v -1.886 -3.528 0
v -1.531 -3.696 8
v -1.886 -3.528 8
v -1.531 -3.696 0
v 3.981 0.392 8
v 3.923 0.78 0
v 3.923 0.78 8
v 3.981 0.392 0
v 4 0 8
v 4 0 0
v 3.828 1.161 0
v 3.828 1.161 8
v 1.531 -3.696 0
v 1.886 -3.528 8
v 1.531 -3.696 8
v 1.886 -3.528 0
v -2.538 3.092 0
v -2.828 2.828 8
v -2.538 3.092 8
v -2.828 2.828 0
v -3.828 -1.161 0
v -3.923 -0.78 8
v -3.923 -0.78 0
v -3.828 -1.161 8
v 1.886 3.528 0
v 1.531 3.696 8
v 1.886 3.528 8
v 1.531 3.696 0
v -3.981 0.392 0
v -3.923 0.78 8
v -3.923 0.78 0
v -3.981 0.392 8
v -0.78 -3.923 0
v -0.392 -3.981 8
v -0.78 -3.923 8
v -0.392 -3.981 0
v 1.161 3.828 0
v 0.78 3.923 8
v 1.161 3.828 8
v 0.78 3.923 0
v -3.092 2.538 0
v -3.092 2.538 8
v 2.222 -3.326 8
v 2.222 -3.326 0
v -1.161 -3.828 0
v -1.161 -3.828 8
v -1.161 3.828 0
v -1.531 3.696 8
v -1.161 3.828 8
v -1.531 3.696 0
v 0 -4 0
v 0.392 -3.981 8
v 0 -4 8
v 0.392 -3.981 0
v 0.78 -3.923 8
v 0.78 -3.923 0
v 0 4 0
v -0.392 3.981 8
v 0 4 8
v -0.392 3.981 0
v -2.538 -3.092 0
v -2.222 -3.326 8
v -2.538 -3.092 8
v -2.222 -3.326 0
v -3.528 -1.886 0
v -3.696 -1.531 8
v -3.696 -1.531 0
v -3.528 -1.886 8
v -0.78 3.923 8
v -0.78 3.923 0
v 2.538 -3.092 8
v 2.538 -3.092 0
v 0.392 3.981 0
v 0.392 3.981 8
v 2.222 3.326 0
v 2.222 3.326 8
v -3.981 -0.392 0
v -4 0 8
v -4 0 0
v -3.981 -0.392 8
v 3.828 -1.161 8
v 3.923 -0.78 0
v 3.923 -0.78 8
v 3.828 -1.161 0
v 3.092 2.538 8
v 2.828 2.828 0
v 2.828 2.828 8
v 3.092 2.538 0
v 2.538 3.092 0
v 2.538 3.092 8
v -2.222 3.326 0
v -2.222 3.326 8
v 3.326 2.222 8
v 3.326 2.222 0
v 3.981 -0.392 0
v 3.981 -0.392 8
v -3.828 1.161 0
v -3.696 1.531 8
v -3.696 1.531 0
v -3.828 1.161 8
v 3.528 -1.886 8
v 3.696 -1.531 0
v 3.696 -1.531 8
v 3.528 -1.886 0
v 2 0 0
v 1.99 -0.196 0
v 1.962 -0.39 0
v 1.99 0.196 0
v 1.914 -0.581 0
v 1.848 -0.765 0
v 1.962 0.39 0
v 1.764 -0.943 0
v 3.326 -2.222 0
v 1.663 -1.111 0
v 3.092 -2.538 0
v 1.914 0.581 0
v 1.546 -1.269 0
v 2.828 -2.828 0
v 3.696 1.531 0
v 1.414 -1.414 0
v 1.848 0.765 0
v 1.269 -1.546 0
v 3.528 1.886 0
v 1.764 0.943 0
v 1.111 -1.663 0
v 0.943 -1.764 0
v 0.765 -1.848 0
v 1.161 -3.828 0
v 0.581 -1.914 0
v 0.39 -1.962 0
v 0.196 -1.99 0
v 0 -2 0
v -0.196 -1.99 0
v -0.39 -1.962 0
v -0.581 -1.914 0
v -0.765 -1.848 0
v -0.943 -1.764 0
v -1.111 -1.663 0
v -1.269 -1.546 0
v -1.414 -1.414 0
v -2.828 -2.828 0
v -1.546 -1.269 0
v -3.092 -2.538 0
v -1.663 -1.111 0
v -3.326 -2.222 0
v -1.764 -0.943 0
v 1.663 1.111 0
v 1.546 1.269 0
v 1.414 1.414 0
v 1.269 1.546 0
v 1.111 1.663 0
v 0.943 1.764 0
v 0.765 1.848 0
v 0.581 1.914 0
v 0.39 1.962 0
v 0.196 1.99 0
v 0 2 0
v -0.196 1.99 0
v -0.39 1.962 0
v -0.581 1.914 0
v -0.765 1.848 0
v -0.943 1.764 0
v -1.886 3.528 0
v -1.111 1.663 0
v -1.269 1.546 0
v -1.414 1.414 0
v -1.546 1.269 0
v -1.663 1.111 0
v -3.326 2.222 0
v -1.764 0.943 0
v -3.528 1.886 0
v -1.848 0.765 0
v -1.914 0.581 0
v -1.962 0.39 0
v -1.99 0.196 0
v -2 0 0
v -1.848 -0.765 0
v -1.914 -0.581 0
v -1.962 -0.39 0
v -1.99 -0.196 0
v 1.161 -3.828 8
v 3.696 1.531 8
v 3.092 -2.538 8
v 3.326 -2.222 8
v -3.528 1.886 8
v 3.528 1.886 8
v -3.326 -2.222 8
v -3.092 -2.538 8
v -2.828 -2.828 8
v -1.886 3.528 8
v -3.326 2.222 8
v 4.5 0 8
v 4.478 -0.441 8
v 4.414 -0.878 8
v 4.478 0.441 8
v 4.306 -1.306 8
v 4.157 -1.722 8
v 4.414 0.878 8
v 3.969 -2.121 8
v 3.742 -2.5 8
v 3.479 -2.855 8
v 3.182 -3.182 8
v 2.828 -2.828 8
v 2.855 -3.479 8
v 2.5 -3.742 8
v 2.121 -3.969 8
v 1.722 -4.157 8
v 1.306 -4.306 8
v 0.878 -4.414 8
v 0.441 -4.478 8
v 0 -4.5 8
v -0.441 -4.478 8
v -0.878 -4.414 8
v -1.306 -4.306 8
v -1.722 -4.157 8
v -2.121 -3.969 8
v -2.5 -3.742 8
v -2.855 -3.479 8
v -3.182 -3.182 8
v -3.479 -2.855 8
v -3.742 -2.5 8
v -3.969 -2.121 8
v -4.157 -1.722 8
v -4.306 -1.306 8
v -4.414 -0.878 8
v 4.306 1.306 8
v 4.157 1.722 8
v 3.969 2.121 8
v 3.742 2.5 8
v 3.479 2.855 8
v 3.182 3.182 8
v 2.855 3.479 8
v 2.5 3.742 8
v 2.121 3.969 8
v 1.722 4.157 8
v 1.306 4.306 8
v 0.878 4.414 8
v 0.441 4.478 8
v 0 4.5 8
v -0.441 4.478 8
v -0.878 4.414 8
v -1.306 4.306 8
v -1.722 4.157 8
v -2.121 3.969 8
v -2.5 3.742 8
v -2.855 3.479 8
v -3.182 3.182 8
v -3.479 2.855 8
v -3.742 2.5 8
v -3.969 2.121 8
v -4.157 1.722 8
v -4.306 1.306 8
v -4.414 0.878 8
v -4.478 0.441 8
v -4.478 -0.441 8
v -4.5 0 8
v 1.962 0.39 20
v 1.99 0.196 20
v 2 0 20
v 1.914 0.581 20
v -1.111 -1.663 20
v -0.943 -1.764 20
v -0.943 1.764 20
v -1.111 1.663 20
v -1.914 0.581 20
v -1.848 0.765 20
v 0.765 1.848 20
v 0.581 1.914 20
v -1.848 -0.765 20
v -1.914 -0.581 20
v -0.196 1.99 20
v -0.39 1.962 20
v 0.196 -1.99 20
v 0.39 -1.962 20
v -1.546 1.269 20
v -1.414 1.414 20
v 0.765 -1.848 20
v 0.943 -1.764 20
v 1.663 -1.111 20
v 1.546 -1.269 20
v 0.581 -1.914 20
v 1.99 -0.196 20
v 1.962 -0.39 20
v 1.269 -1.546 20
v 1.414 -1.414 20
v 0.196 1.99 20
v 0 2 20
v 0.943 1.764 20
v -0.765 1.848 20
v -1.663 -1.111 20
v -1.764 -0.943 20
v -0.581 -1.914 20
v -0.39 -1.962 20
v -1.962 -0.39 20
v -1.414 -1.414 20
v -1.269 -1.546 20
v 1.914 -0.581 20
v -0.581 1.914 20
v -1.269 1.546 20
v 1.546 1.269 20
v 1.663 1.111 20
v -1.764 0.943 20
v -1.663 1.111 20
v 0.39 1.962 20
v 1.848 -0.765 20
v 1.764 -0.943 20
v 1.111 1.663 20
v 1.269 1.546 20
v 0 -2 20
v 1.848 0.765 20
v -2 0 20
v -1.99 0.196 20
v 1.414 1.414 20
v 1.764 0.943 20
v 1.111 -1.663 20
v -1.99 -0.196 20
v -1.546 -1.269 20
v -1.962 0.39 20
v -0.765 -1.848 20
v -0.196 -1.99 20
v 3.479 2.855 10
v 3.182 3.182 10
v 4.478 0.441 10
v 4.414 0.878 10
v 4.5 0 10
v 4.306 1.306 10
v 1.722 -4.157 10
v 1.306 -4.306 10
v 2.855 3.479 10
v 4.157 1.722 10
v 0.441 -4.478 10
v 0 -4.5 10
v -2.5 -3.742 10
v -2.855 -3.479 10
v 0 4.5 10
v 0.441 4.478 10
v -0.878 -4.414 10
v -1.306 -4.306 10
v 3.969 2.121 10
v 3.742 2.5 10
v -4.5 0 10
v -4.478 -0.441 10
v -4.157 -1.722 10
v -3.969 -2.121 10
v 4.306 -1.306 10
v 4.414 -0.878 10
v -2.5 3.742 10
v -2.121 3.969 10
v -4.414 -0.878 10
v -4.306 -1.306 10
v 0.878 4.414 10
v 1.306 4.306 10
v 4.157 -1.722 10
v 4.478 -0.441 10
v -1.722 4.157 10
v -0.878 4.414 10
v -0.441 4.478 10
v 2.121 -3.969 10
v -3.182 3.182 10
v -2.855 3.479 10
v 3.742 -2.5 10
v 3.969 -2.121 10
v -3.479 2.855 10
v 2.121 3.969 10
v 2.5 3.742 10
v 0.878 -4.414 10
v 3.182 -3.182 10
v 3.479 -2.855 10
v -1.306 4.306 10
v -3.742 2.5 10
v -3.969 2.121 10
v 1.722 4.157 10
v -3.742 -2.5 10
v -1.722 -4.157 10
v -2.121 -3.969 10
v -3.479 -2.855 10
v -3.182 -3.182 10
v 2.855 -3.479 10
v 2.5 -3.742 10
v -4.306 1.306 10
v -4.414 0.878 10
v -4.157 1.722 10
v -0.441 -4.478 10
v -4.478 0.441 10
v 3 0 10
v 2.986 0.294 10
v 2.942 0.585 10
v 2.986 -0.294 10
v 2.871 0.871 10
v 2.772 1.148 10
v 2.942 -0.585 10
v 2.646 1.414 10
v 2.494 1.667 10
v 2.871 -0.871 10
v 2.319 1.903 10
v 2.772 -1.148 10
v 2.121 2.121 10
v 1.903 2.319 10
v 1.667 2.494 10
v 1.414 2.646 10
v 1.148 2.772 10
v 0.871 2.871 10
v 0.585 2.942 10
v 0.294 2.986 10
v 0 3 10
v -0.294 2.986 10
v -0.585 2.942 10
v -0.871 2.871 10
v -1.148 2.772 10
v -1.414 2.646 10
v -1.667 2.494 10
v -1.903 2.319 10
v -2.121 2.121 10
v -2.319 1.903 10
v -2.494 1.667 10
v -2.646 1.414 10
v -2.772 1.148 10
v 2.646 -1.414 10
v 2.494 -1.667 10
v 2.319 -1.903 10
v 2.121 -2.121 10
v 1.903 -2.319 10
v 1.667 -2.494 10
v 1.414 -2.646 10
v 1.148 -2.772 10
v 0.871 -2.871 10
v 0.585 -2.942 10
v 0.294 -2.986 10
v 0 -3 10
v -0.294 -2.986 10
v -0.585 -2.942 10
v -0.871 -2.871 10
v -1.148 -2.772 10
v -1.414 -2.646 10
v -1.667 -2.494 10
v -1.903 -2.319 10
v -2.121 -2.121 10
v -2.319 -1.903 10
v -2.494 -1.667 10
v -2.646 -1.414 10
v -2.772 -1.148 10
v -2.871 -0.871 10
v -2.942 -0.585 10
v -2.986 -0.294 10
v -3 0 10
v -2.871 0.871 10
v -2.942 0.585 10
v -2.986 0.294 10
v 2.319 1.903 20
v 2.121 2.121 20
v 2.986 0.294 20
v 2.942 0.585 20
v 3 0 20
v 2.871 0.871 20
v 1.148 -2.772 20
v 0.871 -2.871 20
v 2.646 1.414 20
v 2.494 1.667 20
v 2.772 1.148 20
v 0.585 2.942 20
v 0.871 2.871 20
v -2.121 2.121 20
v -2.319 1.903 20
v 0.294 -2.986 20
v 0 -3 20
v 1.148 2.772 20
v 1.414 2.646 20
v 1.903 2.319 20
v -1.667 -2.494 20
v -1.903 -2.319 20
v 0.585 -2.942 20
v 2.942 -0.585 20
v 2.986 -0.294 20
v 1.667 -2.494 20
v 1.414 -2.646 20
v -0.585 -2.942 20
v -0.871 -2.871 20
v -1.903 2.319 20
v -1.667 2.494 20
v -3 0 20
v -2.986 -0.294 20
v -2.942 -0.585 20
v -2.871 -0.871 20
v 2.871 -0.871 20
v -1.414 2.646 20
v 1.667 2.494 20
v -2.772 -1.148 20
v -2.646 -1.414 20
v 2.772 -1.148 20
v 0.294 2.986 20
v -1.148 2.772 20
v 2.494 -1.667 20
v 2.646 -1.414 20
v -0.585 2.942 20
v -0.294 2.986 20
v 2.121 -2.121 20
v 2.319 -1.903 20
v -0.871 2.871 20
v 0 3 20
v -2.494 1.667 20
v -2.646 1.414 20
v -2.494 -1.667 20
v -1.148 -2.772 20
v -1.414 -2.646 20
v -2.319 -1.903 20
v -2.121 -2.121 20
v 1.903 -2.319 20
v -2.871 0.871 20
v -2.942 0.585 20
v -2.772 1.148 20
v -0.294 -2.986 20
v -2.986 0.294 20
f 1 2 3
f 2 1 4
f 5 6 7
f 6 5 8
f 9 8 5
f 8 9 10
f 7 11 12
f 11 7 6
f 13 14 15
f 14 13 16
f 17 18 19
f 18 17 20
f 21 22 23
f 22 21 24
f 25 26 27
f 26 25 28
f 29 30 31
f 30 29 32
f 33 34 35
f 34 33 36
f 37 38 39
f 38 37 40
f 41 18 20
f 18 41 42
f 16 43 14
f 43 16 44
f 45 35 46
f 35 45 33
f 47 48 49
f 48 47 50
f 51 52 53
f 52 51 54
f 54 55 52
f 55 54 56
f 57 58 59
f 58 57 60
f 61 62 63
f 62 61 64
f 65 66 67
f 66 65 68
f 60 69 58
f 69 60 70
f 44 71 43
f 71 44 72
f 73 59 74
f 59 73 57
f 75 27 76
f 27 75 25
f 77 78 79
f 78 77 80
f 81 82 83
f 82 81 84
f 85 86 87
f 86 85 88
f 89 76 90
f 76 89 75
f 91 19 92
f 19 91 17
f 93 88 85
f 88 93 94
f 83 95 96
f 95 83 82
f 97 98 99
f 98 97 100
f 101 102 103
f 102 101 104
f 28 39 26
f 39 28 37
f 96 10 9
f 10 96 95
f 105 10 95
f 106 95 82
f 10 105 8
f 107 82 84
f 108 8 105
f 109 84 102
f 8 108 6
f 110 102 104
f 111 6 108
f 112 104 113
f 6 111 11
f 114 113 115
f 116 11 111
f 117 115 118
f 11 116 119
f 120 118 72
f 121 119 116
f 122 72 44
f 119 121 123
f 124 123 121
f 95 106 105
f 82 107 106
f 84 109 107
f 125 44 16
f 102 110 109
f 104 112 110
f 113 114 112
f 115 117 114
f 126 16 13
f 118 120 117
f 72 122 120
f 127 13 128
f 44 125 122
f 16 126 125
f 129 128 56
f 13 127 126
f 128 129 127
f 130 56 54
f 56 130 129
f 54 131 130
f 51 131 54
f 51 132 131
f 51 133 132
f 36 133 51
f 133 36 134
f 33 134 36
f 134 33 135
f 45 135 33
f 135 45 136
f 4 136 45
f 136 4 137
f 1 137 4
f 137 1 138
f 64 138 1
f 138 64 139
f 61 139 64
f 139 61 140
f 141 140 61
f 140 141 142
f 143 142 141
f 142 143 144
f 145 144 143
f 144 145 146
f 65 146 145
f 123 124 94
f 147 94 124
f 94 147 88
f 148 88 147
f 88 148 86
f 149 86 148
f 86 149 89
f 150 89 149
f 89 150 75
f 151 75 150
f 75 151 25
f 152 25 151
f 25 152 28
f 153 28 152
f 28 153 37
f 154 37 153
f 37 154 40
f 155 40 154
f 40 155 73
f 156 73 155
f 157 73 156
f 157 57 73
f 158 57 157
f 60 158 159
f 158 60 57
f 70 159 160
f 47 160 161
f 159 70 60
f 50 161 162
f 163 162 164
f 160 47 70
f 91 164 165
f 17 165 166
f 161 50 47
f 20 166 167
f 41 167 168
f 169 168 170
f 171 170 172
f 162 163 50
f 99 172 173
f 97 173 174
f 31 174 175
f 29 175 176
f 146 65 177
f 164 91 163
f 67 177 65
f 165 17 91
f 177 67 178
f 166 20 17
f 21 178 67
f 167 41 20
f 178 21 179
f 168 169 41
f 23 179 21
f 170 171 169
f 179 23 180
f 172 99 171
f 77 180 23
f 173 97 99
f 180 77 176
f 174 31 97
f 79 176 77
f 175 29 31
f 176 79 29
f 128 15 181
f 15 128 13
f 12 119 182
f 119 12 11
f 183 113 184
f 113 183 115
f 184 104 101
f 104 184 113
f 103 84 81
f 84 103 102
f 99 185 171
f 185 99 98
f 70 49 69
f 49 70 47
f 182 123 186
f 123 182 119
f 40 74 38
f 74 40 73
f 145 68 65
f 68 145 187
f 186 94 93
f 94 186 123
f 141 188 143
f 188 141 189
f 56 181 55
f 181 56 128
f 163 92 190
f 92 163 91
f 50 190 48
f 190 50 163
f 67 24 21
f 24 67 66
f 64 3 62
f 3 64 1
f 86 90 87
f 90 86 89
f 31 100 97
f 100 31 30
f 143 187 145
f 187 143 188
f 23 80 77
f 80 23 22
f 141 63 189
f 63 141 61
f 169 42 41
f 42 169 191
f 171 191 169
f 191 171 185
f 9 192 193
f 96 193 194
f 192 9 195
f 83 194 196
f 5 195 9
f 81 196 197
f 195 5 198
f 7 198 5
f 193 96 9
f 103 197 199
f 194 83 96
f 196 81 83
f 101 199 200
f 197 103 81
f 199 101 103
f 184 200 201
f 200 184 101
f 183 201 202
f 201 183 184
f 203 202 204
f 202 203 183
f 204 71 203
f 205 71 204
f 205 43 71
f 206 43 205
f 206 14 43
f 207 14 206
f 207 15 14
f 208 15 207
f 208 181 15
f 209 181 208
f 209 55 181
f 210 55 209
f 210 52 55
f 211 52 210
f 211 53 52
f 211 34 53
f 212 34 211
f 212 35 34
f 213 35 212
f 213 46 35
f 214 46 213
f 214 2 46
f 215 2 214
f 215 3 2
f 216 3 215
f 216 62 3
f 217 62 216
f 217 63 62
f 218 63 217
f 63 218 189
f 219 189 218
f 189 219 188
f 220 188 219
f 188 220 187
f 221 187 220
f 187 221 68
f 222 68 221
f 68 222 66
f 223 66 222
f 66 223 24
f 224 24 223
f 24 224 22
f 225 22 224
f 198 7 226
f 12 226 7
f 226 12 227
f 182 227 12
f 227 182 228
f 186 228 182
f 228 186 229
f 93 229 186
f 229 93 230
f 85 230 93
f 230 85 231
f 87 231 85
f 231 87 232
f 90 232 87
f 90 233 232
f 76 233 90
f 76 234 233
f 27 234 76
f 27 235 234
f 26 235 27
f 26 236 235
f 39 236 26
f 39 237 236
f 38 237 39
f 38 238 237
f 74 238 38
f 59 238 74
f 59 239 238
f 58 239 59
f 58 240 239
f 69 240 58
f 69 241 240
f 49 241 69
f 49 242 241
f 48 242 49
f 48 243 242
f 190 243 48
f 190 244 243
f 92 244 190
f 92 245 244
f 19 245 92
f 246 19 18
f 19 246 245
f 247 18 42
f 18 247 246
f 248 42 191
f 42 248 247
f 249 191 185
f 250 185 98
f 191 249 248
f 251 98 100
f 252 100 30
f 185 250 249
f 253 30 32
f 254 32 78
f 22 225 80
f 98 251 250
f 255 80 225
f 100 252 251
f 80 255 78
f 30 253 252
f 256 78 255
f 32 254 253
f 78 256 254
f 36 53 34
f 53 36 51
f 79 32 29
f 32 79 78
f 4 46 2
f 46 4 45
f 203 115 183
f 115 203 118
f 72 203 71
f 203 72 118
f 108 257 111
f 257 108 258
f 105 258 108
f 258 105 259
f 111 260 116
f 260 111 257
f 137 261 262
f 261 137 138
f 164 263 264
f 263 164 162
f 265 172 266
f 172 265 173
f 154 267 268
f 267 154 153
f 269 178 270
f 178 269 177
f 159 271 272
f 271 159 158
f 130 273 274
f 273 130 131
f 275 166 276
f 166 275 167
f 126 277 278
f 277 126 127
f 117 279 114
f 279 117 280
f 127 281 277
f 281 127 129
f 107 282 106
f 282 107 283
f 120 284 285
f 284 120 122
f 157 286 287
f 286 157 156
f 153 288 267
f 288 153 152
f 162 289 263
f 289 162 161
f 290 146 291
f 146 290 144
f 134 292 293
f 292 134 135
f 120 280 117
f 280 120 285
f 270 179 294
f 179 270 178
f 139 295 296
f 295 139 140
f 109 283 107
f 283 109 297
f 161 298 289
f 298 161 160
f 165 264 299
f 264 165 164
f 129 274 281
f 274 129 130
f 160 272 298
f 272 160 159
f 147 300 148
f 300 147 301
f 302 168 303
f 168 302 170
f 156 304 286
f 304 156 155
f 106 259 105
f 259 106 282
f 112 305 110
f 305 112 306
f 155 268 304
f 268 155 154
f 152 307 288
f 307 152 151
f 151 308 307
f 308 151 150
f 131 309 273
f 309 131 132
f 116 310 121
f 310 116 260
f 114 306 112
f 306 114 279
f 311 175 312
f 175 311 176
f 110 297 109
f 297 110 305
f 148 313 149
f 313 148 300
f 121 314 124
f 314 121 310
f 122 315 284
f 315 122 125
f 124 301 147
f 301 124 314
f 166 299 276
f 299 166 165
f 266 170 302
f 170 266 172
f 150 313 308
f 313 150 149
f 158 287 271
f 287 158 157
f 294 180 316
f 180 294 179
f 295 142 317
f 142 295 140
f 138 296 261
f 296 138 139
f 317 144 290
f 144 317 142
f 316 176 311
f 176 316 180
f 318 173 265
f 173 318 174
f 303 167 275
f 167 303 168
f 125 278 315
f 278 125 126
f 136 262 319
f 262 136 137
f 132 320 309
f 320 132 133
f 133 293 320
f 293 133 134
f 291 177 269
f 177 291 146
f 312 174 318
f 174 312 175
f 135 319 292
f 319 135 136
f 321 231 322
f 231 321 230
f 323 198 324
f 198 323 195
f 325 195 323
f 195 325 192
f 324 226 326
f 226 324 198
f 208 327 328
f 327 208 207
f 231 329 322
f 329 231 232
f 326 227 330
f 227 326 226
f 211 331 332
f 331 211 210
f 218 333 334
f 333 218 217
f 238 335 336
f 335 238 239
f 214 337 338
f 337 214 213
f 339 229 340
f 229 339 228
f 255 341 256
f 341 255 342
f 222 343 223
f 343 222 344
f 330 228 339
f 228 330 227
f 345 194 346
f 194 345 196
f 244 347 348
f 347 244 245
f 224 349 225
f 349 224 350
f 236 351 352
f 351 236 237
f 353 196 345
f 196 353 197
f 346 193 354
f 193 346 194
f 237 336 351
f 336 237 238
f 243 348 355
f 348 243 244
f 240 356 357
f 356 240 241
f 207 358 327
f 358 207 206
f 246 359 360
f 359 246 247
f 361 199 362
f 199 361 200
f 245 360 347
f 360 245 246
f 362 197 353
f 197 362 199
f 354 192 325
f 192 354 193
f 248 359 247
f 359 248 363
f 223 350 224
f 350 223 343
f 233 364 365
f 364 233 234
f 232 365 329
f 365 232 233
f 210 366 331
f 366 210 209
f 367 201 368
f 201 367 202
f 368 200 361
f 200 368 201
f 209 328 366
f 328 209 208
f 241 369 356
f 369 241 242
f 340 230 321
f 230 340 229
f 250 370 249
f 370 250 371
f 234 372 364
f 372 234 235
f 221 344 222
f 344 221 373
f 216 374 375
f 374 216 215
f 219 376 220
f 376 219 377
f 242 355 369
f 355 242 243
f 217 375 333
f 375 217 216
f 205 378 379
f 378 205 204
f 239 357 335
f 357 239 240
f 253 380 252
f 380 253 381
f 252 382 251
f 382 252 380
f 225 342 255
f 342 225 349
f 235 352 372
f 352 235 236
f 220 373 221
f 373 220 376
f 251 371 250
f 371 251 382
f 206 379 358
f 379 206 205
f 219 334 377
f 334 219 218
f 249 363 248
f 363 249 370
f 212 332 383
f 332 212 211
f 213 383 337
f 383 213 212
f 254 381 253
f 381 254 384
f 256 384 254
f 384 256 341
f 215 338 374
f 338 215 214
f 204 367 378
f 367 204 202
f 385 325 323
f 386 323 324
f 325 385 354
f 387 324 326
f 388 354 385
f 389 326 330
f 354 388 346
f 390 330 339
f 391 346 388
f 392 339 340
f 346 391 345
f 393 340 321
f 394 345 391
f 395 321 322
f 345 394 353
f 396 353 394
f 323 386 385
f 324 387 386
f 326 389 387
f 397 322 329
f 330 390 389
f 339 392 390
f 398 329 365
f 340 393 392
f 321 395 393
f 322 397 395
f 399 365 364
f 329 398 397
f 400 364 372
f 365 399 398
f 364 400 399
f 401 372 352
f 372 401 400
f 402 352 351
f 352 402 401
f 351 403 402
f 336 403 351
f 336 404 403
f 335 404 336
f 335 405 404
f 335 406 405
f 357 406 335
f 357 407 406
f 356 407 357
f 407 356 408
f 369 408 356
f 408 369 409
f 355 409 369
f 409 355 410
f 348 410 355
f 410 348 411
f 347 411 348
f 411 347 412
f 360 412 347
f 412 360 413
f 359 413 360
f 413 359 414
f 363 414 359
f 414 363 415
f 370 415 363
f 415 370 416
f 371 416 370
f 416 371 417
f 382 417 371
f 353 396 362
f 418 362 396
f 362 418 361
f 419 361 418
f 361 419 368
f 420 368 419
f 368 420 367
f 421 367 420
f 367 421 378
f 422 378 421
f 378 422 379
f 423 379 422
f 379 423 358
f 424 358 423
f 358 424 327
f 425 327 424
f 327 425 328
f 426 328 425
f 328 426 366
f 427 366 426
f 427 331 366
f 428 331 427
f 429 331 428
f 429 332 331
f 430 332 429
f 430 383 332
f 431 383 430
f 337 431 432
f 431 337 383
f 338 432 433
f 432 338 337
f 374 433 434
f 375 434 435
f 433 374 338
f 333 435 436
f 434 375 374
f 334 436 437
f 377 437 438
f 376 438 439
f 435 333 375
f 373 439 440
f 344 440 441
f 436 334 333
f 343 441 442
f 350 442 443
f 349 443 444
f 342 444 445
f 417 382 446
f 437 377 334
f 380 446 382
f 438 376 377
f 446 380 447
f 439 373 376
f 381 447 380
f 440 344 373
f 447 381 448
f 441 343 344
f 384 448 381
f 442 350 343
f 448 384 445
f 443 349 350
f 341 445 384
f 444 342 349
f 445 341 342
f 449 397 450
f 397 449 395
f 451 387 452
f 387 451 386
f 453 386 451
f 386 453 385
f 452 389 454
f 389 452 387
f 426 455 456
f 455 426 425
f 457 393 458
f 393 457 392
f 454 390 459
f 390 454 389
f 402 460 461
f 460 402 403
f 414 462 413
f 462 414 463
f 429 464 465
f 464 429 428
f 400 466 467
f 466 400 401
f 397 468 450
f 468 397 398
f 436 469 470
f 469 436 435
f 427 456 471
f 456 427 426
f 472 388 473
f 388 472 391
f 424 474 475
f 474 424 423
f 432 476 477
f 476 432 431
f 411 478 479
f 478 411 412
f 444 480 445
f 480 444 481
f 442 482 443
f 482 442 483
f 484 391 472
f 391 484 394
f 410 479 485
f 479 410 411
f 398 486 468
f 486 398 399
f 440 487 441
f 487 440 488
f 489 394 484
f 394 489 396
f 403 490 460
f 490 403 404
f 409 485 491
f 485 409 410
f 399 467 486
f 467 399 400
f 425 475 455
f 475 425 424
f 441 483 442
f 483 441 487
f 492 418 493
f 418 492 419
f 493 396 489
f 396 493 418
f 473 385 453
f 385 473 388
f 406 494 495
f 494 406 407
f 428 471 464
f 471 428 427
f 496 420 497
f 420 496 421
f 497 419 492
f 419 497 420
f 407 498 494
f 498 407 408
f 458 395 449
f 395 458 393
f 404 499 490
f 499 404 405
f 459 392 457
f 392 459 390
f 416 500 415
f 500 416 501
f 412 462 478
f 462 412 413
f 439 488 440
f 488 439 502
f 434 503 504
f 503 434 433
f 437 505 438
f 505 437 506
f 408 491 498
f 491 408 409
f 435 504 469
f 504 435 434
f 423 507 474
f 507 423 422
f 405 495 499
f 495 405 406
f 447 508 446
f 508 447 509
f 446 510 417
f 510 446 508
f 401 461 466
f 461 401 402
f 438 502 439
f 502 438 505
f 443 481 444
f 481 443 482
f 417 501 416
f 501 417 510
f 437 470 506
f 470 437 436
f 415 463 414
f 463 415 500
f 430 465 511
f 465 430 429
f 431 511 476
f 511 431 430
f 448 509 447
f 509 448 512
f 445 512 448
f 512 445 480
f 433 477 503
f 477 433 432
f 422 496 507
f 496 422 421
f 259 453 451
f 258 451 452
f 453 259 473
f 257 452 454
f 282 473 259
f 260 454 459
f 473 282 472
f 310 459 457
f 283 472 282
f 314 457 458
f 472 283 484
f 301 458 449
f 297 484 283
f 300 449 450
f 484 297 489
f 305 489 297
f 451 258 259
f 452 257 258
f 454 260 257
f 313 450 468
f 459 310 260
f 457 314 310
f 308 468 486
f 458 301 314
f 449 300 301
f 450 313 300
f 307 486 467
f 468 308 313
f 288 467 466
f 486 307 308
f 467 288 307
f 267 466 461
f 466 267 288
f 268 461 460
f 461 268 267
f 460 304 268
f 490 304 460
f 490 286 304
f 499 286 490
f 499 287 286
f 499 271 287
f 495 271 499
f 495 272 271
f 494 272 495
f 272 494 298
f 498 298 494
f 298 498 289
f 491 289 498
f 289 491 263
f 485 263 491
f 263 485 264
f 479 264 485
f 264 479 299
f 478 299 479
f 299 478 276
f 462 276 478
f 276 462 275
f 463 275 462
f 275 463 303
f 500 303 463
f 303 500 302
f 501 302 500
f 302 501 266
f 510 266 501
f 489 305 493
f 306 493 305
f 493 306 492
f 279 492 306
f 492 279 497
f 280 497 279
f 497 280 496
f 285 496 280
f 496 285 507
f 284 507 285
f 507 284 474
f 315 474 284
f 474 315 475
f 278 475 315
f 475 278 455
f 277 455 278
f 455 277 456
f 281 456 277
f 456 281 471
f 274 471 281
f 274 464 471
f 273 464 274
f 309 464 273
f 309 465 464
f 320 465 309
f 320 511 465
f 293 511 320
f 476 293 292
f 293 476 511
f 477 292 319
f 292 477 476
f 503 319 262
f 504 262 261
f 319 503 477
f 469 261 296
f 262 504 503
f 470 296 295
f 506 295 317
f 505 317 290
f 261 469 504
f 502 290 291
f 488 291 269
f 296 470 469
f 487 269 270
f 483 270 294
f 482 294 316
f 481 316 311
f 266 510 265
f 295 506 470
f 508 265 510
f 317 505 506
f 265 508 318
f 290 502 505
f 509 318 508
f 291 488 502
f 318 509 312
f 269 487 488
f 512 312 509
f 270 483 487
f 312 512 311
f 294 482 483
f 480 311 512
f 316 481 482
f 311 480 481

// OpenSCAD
part = "Inner"; // [Inner, Outer, Both]
outer_design = "Round"; // [Round, Square]
diameter_to_adapt=8;//[5:1:16]
length_to_adapt=8;//[5:1:16]
internal_diameter=4;//[2:1:10]
hose_id=6;//[2:1:10]
hose_od=9;//[4:1:12]
hose_hold_length=10;//[4:1:20]
$fn= $preview ? 32 : 64;
module inner() {
  difference(){
      cylinder(length_to_adapt,diameter_to_adapt/2,diameter_to_adapt/2);
      cylinder(length_to_adapt,internal_diameter/2,internal_diameter/2);}
  translate([0,0,length_to_adapt]) difference(){
      cylinder(2,hose_od/2,hose_od/2);
      cylinder(2,internal_diameter/2,internal_diameter/2);}
     translate([0,0,length_to_adapt+2]) difference(){
      cylinder(hose_hold_length,hose_id/2,hose_id/2);
      cylinder(hose_hold_length,internal_diameter/2,internal_diameter/2);}
}
module outer() {
    if (outer_design=="Round")
translate([0,0,length_to_adapt]) difference(){
      cylinder(2+hose_hold_length,(hose_od+4)/2,(hose_od+4)/2);
      cylinder(2+hose_hold_length,hose_od/2,hose_od/2);}
      else translate([0,0,length_to_adapt]) difference(){
      translate([0,0,(2+hose_hold_length)/2])cube(2+hose_hold_length,(hose_od+4)/2,(hose_od+4)/2,center=true);
      cylinder(2+hose_hold_length,hose_od/2,hose_od/2);}

}
if (part=="Inner") {
    inner(); 
}
else if (part=="Outer") {
    outer();
}
else if (part=="Both") {
    inner();
    outer(); 
}
